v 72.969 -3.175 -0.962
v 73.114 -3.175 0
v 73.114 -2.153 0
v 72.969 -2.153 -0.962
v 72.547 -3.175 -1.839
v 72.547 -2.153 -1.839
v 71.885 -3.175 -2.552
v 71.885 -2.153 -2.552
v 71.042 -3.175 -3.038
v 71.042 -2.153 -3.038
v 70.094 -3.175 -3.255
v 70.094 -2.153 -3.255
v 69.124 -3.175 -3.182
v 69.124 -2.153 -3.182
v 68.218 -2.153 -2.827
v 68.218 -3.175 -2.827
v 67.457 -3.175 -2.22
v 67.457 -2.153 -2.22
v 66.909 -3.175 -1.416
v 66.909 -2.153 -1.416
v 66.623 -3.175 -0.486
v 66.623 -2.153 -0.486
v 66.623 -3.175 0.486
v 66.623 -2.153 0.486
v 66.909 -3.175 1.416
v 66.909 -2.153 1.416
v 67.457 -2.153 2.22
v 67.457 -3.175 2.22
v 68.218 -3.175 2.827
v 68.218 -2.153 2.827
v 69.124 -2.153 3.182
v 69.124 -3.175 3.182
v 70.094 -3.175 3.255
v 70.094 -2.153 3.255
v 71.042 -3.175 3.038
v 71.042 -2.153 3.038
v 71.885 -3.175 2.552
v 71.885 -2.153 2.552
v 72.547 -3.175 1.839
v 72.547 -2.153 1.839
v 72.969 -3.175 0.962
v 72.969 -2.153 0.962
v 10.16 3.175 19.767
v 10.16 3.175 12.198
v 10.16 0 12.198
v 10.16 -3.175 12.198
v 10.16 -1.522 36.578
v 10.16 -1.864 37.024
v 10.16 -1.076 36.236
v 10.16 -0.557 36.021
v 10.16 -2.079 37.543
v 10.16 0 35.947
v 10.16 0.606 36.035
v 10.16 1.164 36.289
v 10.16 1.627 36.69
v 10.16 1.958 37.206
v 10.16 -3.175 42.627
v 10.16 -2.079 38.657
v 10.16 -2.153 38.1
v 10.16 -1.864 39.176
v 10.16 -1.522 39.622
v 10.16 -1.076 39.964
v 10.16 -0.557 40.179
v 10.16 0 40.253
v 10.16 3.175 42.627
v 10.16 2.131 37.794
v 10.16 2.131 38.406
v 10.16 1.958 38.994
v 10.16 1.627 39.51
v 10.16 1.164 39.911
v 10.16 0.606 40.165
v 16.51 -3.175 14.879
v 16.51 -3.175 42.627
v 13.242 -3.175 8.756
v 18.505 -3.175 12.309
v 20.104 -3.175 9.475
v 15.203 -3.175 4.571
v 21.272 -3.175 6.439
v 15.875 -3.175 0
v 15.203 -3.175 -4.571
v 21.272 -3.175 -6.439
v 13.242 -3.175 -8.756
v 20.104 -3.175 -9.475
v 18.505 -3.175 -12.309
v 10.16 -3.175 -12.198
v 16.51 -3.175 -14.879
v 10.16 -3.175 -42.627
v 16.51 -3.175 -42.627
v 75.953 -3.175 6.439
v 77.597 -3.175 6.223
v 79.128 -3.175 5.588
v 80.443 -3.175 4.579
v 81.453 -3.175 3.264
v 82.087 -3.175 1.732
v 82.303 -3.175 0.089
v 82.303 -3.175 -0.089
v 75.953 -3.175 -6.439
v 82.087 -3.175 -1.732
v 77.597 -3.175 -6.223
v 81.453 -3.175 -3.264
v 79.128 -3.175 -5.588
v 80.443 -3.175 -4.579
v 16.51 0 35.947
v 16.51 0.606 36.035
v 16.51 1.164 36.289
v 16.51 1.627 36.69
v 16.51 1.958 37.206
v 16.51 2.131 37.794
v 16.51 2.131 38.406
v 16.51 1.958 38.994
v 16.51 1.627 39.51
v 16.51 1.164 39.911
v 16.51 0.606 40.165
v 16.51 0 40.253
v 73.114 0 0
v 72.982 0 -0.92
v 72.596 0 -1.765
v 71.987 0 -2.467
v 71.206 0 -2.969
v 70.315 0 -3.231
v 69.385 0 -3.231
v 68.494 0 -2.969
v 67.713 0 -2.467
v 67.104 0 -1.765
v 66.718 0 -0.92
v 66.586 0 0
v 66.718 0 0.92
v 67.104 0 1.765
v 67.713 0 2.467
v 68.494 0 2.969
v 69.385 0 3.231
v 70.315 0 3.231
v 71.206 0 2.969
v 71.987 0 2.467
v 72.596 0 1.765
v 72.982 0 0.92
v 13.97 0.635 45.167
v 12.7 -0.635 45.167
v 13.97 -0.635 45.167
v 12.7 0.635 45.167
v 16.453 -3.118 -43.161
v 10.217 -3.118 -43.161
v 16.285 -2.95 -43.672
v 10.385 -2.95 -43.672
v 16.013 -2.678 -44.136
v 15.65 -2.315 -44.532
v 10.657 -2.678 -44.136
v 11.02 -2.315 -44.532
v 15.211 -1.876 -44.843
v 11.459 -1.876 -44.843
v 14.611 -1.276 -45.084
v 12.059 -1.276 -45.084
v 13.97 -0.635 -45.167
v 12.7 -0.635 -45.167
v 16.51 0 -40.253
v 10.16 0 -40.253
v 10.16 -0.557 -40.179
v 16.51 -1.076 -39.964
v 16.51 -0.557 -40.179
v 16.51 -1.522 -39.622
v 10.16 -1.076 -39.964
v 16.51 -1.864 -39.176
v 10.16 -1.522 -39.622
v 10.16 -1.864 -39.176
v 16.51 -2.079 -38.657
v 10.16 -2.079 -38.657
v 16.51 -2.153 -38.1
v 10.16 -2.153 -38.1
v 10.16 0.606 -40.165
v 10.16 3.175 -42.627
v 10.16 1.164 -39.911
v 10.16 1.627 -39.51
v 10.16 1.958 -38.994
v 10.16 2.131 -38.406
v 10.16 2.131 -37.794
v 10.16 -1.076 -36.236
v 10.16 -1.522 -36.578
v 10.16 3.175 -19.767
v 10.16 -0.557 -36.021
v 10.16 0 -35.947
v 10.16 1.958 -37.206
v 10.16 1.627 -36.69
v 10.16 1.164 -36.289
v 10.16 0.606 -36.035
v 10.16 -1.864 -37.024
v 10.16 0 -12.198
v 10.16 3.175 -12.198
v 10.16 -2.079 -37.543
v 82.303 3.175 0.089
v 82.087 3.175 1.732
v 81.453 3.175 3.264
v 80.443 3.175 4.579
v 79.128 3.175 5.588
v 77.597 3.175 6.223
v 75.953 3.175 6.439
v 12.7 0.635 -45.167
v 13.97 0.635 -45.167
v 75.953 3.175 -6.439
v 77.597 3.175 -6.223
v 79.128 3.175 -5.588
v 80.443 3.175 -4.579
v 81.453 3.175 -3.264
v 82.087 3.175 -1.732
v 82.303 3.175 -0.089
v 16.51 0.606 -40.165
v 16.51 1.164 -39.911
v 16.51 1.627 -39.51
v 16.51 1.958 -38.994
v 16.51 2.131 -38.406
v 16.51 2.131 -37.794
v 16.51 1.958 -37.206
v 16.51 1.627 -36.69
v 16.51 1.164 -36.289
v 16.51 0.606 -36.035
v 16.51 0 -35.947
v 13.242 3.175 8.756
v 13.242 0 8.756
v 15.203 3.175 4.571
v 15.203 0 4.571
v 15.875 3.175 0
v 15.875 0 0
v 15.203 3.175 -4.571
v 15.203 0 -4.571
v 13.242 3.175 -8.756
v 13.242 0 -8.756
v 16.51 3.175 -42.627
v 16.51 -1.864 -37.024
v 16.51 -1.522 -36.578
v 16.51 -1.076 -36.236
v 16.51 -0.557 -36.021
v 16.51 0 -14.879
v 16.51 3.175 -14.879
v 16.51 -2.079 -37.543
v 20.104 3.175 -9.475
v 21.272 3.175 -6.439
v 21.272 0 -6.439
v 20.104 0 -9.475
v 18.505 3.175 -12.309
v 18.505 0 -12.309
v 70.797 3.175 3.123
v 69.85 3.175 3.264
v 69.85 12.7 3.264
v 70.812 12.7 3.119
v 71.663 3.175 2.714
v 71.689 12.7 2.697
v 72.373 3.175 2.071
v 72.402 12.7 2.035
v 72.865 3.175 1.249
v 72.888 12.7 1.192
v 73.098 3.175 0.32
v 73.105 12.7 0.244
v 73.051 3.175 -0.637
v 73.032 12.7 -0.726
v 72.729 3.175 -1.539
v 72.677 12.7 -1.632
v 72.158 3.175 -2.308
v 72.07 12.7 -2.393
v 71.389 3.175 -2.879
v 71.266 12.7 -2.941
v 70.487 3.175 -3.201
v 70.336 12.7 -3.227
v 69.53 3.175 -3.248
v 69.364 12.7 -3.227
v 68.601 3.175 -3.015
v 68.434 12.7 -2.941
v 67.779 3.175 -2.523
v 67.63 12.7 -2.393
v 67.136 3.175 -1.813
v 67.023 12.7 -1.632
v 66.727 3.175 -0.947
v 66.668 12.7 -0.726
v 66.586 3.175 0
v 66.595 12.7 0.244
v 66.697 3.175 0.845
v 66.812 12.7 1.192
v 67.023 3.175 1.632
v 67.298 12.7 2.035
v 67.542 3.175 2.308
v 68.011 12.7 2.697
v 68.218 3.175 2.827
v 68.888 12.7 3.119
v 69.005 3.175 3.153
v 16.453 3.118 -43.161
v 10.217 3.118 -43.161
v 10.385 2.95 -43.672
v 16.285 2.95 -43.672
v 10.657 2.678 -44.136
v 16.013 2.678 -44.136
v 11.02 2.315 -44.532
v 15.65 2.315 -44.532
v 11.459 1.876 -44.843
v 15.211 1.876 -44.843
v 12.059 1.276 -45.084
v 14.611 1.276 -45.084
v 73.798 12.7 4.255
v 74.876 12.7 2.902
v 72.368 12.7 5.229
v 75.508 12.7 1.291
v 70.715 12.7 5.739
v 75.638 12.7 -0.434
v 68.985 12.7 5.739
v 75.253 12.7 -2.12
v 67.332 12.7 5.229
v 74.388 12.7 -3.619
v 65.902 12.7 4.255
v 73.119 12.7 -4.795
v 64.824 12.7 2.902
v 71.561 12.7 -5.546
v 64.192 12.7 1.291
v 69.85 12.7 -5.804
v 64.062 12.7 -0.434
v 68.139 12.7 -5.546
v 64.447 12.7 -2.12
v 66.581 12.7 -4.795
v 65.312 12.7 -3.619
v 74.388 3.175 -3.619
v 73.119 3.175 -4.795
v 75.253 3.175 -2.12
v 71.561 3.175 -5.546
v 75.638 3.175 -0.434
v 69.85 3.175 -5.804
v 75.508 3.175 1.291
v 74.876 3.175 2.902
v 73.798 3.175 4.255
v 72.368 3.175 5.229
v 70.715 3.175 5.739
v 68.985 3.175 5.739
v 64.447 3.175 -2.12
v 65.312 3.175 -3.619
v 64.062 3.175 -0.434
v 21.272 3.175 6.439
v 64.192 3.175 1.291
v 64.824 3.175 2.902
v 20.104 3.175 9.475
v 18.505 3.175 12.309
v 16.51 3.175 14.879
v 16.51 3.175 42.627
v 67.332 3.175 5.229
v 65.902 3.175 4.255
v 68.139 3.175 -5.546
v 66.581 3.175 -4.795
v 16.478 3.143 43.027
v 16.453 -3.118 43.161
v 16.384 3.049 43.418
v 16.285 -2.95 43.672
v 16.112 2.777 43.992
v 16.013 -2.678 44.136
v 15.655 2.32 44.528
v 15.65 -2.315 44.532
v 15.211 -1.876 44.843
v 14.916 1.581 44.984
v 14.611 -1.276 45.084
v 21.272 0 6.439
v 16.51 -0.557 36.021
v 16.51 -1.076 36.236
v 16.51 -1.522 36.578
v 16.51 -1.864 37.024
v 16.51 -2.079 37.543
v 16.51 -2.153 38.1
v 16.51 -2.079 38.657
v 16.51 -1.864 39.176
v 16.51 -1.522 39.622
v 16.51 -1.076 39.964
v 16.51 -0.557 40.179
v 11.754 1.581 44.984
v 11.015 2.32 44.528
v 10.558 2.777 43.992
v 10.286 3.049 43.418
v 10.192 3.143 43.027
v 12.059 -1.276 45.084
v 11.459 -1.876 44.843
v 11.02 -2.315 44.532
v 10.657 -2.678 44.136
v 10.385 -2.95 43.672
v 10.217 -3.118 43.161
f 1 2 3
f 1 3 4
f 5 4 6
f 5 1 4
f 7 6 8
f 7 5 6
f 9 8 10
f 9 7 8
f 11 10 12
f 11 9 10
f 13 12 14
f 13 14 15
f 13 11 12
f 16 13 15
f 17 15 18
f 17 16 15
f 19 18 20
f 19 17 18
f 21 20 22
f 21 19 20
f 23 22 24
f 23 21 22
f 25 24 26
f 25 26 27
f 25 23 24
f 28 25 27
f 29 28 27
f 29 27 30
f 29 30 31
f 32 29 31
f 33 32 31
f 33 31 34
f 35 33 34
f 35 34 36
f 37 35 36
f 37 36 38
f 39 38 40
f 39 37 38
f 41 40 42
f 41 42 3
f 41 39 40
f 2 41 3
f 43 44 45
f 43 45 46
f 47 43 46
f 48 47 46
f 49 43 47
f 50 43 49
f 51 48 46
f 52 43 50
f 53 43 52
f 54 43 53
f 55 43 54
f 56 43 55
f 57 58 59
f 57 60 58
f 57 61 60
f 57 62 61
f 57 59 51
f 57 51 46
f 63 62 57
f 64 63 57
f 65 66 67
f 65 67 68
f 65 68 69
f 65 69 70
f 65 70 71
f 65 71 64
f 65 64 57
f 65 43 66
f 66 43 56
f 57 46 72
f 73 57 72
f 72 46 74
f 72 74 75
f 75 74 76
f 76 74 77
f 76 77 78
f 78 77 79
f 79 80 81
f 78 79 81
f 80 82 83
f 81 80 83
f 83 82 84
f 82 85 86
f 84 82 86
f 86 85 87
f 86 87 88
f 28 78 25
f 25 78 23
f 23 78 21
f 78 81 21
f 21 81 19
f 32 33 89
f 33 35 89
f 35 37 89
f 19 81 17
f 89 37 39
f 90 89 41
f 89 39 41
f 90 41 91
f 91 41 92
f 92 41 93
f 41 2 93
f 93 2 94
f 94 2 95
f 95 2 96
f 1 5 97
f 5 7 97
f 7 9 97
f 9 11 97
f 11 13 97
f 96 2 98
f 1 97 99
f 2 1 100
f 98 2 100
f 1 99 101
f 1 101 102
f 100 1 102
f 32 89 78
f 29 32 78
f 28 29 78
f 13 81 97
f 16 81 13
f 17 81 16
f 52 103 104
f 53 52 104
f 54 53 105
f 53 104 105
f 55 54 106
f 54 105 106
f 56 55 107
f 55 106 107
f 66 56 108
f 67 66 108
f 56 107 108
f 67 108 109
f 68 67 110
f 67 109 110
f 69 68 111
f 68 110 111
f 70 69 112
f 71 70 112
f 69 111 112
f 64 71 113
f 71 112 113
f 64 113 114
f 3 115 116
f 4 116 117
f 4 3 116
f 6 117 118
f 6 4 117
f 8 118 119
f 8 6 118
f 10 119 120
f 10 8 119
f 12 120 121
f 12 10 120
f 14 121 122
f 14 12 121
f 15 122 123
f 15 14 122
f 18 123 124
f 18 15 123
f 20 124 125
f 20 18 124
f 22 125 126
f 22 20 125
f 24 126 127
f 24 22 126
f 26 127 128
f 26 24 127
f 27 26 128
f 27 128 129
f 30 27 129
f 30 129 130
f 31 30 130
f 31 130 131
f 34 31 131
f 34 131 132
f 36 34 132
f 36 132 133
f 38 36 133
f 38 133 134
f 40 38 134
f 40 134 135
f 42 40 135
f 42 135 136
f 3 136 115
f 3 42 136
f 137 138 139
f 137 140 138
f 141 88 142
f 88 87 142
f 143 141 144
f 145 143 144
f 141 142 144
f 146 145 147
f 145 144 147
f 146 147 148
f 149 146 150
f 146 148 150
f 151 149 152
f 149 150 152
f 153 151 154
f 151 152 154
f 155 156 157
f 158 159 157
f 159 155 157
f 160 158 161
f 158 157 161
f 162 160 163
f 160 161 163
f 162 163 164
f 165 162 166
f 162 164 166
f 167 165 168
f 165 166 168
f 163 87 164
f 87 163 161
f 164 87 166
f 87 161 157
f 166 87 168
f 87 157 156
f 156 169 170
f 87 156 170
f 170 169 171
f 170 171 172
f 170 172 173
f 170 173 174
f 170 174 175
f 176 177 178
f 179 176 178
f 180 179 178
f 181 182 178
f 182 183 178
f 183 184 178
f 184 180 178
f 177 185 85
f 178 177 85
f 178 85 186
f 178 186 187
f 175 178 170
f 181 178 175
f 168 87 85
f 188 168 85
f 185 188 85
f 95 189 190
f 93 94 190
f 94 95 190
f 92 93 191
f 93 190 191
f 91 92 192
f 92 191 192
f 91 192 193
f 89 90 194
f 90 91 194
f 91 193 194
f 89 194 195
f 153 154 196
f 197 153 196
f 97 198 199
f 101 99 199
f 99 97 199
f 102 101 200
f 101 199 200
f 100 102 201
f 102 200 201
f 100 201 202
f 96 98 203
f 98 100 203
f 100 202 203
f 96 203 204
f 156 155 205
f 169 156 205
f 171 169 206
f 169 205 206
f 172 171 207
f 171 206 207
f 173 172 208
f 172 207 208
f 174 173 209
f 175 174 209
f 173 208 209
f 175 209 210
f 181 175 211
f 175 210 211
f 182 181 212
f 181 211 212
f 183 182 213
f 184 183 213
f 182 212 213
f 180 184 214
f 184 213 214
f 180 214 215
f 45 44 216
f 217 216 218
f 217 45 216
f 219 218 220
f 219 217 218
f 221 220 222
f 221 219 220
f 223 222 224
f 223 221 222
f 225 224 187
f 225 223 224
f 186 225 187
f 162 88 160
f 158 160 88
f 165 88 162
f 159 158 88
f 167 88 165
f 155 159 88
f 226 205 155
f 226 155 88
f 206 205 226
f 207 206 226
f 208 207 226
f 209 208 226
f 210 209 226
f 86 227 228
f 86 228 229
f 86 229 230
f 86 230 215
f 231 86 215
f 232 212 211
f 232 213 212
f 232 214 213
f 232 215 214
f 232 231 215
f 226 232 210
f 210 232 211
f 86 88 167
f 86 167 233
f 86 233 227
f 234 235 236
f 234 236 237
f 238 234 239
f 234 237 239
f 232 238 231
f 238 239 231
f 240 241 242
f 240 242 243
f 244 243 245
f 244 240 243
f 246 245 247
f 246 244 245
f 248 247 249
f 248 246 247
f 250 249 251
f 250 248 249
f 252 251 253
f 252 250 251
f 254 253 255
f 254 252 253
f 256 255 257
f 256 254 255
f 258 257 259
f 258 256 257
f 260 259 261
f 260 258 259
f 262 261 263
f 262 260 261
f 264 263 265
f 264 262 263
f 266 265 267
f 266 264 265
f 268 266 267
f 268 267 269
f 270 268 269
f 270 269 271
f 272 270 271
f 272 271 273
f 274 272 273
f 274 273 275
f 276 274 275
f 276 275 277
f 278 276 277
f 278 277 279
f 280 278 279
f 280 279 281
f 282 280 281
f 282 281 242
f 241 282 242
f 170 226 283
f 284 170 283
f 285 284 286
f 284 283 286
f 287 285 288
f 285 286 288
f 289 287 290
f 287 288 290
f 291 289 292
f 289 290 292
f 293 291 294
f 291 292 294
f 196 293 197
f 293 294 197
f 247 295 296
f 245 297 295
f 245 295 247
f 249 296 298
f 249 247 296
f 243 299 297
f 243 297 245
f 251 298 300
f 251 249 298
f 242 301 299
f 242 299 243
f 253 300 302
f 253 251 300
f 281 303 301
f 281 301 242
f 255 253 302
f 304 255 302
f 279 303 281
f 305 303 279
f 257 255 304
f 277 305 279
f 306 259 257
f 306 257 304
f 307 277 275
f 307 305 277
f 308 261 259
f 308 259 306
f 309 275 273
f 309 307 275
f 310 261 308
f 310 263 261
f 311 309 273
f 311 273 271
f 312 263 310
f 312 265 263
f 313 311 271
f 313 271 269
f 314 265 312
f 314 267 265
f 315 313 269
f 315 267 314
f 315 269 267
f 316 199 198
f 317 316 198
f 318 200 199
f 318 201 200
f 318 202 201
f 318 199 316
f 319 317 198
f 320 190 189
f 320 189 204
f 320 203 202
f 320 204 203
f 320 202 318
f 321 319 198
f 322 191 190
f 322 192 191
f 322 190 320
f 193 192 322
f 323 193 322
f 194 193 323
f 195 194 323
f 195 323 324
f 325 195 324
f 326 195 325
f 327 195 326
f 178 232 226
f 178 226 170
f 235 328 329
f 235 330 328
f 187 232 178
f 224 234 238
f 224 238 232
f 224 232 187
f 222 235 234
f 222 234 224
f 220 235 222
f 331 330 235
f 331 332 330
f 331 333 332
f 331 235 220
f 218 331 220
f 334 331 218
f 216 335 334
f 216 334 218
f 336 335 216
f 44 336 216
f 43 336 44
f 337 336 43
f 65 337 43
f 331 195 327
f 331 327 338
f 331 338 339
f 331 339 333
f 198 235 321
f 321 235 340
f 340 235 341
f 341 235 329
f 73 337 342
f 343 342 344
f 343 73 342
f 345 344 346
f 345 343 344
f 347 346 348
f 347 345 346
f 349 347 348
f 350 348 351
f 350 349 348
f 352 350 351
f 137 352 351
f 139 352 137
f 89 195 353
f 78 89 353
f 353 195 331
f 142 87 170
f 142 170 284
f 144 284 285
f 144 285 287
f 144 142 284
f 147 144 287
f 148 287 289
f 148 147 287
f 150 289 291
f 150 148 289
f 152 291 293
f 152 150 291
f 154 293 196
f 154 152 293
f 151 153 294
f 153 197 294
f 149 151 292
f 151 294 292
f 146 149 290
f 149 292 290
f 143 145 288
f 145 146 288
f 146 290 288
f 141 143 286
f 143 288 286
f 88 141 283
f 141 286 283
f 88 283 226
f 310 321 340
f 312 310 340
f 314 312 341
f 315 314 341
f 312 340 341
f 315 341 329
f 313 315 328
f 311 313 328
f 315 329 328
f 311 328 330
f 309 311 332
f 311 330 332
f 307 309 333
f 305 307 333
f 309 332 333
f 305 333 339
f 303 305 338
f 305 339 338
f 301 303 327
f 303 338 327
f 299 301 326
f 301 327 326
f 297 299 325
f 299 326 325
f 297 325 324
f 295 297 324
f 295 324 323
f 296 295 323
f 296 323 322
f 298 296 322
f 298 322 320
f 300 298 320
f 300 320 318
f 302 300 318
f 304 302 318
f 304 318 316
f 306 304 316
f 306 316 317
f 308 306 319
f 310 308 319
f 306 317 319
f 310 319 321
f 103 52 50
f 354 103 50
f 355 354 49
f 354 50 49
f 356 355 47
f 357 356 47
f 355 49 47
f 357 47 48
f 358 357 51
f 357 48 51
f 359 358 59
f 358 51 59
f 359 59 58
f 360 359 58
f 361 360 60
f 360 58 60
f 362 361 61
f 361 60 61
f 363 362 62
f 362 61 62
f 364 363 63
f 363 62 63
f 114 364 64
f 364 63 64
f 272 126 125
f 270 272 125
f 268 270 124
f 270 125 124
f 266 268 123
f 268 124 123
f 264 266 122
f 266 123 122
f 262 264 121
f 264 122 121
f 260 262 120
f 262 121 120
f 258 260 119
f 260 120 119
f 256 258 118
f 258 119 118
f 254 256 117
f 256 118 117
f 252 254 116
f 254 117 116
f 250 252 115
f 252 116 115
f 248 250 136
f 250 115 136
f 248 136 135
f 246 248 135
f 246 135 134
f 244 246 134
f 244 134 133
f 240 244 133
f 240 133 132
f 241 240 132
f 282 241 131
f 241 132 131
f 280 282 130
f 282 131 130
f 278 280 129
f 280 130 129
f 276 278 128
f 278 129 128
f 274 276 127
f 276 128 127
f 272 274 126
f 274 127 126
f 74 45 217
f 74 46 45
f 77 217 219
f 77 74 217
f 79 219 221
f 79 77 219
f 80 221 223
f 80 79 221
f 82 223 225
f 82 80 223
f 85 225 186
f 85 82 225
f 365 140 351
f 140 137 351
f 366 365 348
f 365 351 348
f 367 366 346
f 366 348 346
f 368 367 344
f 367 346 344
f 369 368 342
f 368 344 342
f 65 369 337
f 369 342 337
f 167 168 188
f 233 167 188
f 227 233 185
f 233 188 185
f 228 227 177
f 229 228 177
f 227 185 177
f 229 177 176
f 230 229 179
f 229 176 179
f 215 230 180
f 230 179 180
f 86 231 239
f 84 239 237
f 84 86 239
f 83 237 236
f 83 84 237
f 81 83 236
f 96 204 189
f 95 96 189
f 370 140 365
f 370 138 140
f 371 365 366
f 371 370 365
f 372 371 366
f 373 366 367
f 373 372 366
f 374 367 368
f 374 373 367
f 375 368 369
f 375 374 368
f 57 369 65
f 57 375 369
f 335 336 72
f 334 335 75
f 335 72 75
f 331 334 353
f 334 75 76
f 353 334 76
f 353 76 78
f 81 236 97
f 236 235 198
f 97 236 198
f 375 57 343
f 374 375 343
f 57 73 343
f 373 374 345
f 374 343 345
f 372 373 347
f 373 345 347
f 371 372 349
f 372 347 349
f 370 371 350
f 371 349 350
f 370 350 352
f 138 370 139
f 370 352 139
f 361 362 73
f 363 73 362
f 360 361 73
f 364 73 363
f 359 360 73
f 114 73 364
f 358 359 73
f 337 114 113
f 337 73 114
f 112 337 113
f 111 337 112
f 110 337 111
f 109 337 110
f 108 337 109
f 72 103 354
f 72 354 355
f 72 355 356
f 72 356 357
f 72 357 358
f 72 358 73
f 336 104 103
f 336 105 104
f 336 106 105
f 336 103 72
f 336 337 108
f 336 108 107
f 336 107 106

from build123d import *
from build123d.topology import SkipClean

# Parameters (mm, degrees)
SKETCH1_R                = 22.225
SKETCH1_R_2              = 15.875
BOSS_EXTRUDE1_DEPTH      = 3.175
BOSS_EXTRUDE2_DEPTH      = 3.175
F_0_257_DIAMETER_HOLE1_D = 6.5278
SKETCH6_W                = 65.552410467
SKETCH6_H                = 82.171101747
CUT_EXTRUDE2_DEPTH       = 86.310457973
BOSS_EXTRUDE3_DEPTH      = 3.175
SKETCH12_R               = 2.15265
CUT_EXTRUDE4_DEPTH       = 80.867912855
SKETCH13_R               = 5.8039
SKETCH13_R_2             = 3.2639
BOSS_EXTRUDE4_DEPTH      = 9.525
MIRROR2_START            = -3.175
MIRROR2_OUTLINE_R        = 3.2639
MIRROR2_DEPTH            = 1.0223499
MIRROR2_START_2          = 12.081931798
MIRROR2_2_OUTLINE_W      = 2.1526501
MIRROR2_2_OUTLINE_H      = 12.8778
MIRROR2_2_DEPTH          = 70.221427729
MIRROR2_START_3          = 10.16
MIRROR2_3_DEPTH          = 11.111840348
MIRROR2_4_DEPTH          = 6.35
MIRROR2_START_4          = -2.1526501
MIRROR2_5_OUTLINE_R      = 3.2639
MIRROR2_5_DEPTH          = 2.1526501
FILLET5_R                = 2.54


with BuildPart() as part:
    # Sketch1 → Boss-Extrude1 (new body)
    with BuildSketch(Plane(origin=(0, 0, 0), x_dir=(1, 0, 0), z_dir=(0, 1, 0))):
        with Locations(Location((0, 0, 0), (0, 0, 270))):
            Circle(SKETCH1_R)
        with Locations(Location((0, 0, 0), (0, 0, 270))):
            Circle(SKETCH1_R_2, mode=Mode.SUBTRACT)
    extrude(amount=BOSS_EXTRUDE1_DEPTH)

    # Sketch2 → Boss-Extrude2 (add)
    with BuildSketch(Plane(origin=(0, 3.175, 0), x_dir=(1, 0, 0), z_dir=(0, 1, 0))):
        with BuildLine():
            Line((75.953359527, -6.4389), (38.518839527, -6.4389))
            Line((38.518839527, -6.4389), (17.590769706, -6.4389))
            Line((17.590769706, -6.4389), (17.590769706, 6.4389))
            Line((17.590769706, 6.4389), (38.518839527, 6.4389))
            Line((38.518839527, 6.4389), (75.953359527, 6.4389))
            ThreePointArc((75.953359527, 6.4389), (80.443487588, 4.579028061), (82.303359527, 0.0889))
            Line((82.303359527, 0.0889), (82.303359527, -0.0889))
            ThreePointArc((82.303359527, -0.0889), (80.443487588, -4.579028061), (75.953359527, -6.4389))
        make_face()
    extrude(amount=-BOSS_EXTRUDE2_DEPTH)

    # F (0.257) Diameter Hole1 (through all)
    with Locations(Plane(origin=(0, 3.175, 0), x_dir=(1, 0, 0), z_dir=(0, 1, 0))):
        with Locations((69.85, 0)):
            Hole(F_0_257_DIAMETER_HOLE1_D / 2)

    # Sketch6 → Cut-Extrude2 (cut, through all)
    with BuildSketch(Plane(origin=(0, 3.175, 0), x_dir=(1, 0, 0), z_dir=(0, 1, 0))):
        with Locations((-22.616205234, -1.153387837)):
            Rectangle(SKETCH6_W, SKETCH6_H)
    extrude(amount=-CUT_EXTRUDE2_DEPTH, mode=Mode.SUBTRACT)

    # Sketch9 → Boss-Extrude3 (add)
    with BuildSketch(Plane(origin=(0, 3.175, 0), x_dir=(1, 0, 0), z_dir=(0, 1, 0))):
        Polygon((10.16, 19.766765669), (10.16, 45.166765669), (16.51, 45.166765669), (16.51, 14.878525633), align=None)
    boss_extrude3 = extrude(amount=-BOSS_EXTRUDE3_DEPTH)

    # Mirror1: Boss-Extrude3 across plane
    add(boss_extrude3.mirror(Plane.XY))

    # Sketch12 → Cut-Extrude4 (cut, through all)
    with BuildSketch(Plane(origin=(16.51, 0, 0), x_dir=(0, 0, -1), z_dir=(1, 0, 0))):
        with Locations((38.1, 0)):
            Circle(SKETCH12_R)
        with Locations((-38.1, 0)):
            Circle(SKETCH12_R)
    extrude(amount=-CUT_EXTRUDE4_DEPTH, mode=Mode.SUBTRACT)

    # Sketch13 → Boss-Extrude4 (add)
    with SkipClean():  # the faces are left unmerged after this step: merging them gives an invalid solid
        with BuildSketch(Plane(origin=(0, 3.175, 0), x_dir=(1, 0, 0), z_dir=(0, 1, 0))):
            with Locations(Location((69.85, 0, 0), (0, 0, 90))):
                Circle(SKETCH13_R)
            with Locations(Location((69.85, 0, 0), (0, 0, 270))):
                Circle(SKETCH13_R_2, mode=Mode.SUBTRACT)
        extrude(amount=BOSS_EXTRUDE4_DEPTH)



with BuildPart() as body_2:
    # Mirror2: read off the stored shape, not the designer's step
    # Mirror2 outline → Mirror2 (new body)
    with BuildSketch(Plane(origin=(0, 0, 0), x_dir=(1, 0, 0), z_dir=(0, 1, 0)).offset(MIRROR2_START)):
        with BuildLine():
            Line((10.16, 45.166765669), (10.16, 12.197951672))
            ThreePointArc((10.16, 12.197951672), (15.875, 0), (10.16, -12.197951672))
            Line((10.16, -12.197951672), (10.16, -45.166765669))
            Line((10.16, -45.166765669), (16.51, -45.166765669))
            Line((16.51, -45.166765669), (16.51, -14.878525633))
            ThreePointArc((16.51, -14.878525633), (19.356489486, -10.921398252), (21.271840348, -6.4389))
            Line((21.271840348, -6.4389), (75.953359527, -6.4389))
            ThreePointArc((75.953359527, -6.4389), (80.443487588, -4.579028061), (82.303359527, -0.0889))
            Line((82.303359527, -0.0889), (82.303359527, 0.0889))
            ThreePointArc((82.303359527, 0.0889), (80.443487588, 4.579028061), (75.953359527, 6.4389))
            Line((75.953359527, 6.4389), (21.271840348, 6.4389))
            ThreePointArc((21.271840348, 6.4389), (19.356489486, 10.921398252), (16.51, 14.878525633))
            Line((16.51, 14.878525633), (16.51, 45.166765669))
            Line((16.51, 45.166765669), (10.16, 45.166765669))
        make_face()
        with Locations((69.85, 0)):
            Circle(MIRROR2_OUTLINE_R, mode=Mode.SUBTRACT)
    extrude(amount=MIRROR2_DEPTH)


with BuildPart() as part_1:
    with SkipClean():  # the faces are left unmerged after this step: merging them gives an invalid solid
        add(part.part)

        add(body_2.part)  # Mirror2 2 merges body 2
        # Mirror2 2 outline → Mirror2 2 (add)
        with BuildSketch(Plane.YZ.offset(MIRROR2_START_2)):
            with Locations((-1.07632505, 0)):
                Rectangle(MIRROR2_2_OUTLINE_W, MIRROR2_2_OUTLINE_H)
        extrude(amount=MIRROR2_2_DEPTH)

    # Mirror2 3 outline → Mirror2 3 (add)
    with SkipClean():  # the faces are left unmerged after this step: merging them gives an invalid solid
        with BuildSketch(Plane.YZ.offset(MIRROR2_START_3)):
            with BuildLine():
                Line((0, -6.4389), (-2.1526501, -6.4389))
                Line((-2.1526501, -6.4389), (-2.15265, -38.1))
                ThreePointArc((-2.15265, -38.1), (-1.522153413, -36.577846587), (0, -35.94735))
                Line((0, -35.94735), (0, -6.4389))
            make_face()
            with BuildLine():
                Line((-2.15265, 38.1), (-2.1526501, 6.4389))
                Line((-2.1526501, 6.4389), (0, 6.4389))
                Line((0, 6.4389), (0, 35.94735))
                ThreePointArc((0, 35.94735), (-1.522153413, 36.577846587), (-2.15265, 38.1))
            make_face()
        extrude(amount=MIRROR2_3_DEPTH)

    # Mirror2 4 outline → Mirror2 4 (add)
    with SkipClean():  # the faces are left unmerged after this step: merging them gives an invalid solid
        with BuildSketch(Plane.YZ.offset(MIRROR2_START_3)):
            with BuildLine():
                ThreePointArc((0, -40.25265), (-1.522153413, -39.622153413), (-2.15265, -38.1))
                Line((-2.15265, -38.1), (-2.1526501, -45.166765669))
                Line((-2.1526501, -45.166765669), (0, -45.166765669))
                Line((0, -45.166765669), (0, -40.25265))
            make_face()
            with BuildLine():
                Line((-2.1526501, 45.166765669), (-2.15265, 38.1))
                ThreePointArc((-2.15265, 38.1), (-1.522153413, 39.622153413), (0, 40.25265))
                Line((0, 40.25265), (0, 45.166765669))
                Line((0, 45.166765669), (-2.1526501, 45.166765669))
            make_face()
        extrude(amount=MIRROR2_4_DEPTH)

    # Mirror2 5 outline → Mirror2 5 (cut)
    with BuildSketch(Plane(origin=(0, 0, 0), x_dir=(1, 0, 0), z_dir=(0, 1, 0)).offset(MIRROR2_START_4)):
        with BuildLine():
            Line((16.51, 40), (16.51, 14.878525633))
            ThreePointArc((16.51, 14.878525633), (19.356489486, 10.921398252), (21.271840348, 6.4389))
            Line((21.271840348, 6.4389), (21.271840348, 40))
            Line((21.271840348, 40), (16.51, 40))
        make_face()
        with BuildLine():
            Line((82.303359527, 6.4389), (75.953359527, 6.4389))
            ThreePointArc((75.953359527, 6.4389), (80.443487588, 4.579028061), (82.303359527, 0.0889))
            Line((82.303359527, 0.0889), (82.303359527, 6.4389))
        make_face()
        with BuildLine():
            Line((10.16, 6.4389), (12.081931798, 6.4389))
            Line((12.081931798, 6.4389), (12.081931798, -6.4389))
            Line((12.081931798, -6.4389), (10.16, -6.4389))
            Line((10.16, -6.4389), (10.16, -12.197951672))
            ThreePointArc((10.16, -12.197951672), (15.875, 0), (10.16, 12.197951672))
            Line((10.16, 12.197951672), (10.16, 6.4389))
        make_face()
        with BuildLine():
            Line((82.303359527, -6.4389), (82.303359527, -0.0889))
            ThreePointArc((82.303359527, -0.0889), (80.443487588, -4.579028061), (75.953359527, -6.4389))
            Line((75.953359527, -6.4389), (82.303359527, -6.4389))
        make_face()
        with BuildLine():
            Line((21.271840348, -40), (21.271840348, -6.4389))
            ThreePointArc((21.271840348, -6.4389), (19.356489486, -10.921398252), (16.51, -14.878525633))
            Line((16.51, -14.878525633), (16.51, -40))
            Line((16.51, -40), (21.271840348, -40))
        make_face()
        with Locations((69.85, 0)):
            Circle(MIRROR2_5_OUTLINE_R)
    extrude(amount=MIRROR2_5_DEPTH, mode=Mode.SUBTRACT)

    # Fillet5
    fillet5_edges = [part_1.edges().sort_by_distance(p)[0] for p in [
        (13.335, -3.175, -45.166765669),
        (13.335, -3.175, 45.166765669),
        (13.335, 3.175, -45.166765669),
        (10.16, 1.5875, -45.166765669),
        (16.51, 1.5875, -45.166765669),
        (13.335, 3.175, 45.166765669),
        (16.51, 1.5875, 45.166765669),
        (10.16, 1.5875, 45.166765669),
    ]]
    fillet(fillet5_edges, radius=FILLET5_R)


solid = part_1.part
